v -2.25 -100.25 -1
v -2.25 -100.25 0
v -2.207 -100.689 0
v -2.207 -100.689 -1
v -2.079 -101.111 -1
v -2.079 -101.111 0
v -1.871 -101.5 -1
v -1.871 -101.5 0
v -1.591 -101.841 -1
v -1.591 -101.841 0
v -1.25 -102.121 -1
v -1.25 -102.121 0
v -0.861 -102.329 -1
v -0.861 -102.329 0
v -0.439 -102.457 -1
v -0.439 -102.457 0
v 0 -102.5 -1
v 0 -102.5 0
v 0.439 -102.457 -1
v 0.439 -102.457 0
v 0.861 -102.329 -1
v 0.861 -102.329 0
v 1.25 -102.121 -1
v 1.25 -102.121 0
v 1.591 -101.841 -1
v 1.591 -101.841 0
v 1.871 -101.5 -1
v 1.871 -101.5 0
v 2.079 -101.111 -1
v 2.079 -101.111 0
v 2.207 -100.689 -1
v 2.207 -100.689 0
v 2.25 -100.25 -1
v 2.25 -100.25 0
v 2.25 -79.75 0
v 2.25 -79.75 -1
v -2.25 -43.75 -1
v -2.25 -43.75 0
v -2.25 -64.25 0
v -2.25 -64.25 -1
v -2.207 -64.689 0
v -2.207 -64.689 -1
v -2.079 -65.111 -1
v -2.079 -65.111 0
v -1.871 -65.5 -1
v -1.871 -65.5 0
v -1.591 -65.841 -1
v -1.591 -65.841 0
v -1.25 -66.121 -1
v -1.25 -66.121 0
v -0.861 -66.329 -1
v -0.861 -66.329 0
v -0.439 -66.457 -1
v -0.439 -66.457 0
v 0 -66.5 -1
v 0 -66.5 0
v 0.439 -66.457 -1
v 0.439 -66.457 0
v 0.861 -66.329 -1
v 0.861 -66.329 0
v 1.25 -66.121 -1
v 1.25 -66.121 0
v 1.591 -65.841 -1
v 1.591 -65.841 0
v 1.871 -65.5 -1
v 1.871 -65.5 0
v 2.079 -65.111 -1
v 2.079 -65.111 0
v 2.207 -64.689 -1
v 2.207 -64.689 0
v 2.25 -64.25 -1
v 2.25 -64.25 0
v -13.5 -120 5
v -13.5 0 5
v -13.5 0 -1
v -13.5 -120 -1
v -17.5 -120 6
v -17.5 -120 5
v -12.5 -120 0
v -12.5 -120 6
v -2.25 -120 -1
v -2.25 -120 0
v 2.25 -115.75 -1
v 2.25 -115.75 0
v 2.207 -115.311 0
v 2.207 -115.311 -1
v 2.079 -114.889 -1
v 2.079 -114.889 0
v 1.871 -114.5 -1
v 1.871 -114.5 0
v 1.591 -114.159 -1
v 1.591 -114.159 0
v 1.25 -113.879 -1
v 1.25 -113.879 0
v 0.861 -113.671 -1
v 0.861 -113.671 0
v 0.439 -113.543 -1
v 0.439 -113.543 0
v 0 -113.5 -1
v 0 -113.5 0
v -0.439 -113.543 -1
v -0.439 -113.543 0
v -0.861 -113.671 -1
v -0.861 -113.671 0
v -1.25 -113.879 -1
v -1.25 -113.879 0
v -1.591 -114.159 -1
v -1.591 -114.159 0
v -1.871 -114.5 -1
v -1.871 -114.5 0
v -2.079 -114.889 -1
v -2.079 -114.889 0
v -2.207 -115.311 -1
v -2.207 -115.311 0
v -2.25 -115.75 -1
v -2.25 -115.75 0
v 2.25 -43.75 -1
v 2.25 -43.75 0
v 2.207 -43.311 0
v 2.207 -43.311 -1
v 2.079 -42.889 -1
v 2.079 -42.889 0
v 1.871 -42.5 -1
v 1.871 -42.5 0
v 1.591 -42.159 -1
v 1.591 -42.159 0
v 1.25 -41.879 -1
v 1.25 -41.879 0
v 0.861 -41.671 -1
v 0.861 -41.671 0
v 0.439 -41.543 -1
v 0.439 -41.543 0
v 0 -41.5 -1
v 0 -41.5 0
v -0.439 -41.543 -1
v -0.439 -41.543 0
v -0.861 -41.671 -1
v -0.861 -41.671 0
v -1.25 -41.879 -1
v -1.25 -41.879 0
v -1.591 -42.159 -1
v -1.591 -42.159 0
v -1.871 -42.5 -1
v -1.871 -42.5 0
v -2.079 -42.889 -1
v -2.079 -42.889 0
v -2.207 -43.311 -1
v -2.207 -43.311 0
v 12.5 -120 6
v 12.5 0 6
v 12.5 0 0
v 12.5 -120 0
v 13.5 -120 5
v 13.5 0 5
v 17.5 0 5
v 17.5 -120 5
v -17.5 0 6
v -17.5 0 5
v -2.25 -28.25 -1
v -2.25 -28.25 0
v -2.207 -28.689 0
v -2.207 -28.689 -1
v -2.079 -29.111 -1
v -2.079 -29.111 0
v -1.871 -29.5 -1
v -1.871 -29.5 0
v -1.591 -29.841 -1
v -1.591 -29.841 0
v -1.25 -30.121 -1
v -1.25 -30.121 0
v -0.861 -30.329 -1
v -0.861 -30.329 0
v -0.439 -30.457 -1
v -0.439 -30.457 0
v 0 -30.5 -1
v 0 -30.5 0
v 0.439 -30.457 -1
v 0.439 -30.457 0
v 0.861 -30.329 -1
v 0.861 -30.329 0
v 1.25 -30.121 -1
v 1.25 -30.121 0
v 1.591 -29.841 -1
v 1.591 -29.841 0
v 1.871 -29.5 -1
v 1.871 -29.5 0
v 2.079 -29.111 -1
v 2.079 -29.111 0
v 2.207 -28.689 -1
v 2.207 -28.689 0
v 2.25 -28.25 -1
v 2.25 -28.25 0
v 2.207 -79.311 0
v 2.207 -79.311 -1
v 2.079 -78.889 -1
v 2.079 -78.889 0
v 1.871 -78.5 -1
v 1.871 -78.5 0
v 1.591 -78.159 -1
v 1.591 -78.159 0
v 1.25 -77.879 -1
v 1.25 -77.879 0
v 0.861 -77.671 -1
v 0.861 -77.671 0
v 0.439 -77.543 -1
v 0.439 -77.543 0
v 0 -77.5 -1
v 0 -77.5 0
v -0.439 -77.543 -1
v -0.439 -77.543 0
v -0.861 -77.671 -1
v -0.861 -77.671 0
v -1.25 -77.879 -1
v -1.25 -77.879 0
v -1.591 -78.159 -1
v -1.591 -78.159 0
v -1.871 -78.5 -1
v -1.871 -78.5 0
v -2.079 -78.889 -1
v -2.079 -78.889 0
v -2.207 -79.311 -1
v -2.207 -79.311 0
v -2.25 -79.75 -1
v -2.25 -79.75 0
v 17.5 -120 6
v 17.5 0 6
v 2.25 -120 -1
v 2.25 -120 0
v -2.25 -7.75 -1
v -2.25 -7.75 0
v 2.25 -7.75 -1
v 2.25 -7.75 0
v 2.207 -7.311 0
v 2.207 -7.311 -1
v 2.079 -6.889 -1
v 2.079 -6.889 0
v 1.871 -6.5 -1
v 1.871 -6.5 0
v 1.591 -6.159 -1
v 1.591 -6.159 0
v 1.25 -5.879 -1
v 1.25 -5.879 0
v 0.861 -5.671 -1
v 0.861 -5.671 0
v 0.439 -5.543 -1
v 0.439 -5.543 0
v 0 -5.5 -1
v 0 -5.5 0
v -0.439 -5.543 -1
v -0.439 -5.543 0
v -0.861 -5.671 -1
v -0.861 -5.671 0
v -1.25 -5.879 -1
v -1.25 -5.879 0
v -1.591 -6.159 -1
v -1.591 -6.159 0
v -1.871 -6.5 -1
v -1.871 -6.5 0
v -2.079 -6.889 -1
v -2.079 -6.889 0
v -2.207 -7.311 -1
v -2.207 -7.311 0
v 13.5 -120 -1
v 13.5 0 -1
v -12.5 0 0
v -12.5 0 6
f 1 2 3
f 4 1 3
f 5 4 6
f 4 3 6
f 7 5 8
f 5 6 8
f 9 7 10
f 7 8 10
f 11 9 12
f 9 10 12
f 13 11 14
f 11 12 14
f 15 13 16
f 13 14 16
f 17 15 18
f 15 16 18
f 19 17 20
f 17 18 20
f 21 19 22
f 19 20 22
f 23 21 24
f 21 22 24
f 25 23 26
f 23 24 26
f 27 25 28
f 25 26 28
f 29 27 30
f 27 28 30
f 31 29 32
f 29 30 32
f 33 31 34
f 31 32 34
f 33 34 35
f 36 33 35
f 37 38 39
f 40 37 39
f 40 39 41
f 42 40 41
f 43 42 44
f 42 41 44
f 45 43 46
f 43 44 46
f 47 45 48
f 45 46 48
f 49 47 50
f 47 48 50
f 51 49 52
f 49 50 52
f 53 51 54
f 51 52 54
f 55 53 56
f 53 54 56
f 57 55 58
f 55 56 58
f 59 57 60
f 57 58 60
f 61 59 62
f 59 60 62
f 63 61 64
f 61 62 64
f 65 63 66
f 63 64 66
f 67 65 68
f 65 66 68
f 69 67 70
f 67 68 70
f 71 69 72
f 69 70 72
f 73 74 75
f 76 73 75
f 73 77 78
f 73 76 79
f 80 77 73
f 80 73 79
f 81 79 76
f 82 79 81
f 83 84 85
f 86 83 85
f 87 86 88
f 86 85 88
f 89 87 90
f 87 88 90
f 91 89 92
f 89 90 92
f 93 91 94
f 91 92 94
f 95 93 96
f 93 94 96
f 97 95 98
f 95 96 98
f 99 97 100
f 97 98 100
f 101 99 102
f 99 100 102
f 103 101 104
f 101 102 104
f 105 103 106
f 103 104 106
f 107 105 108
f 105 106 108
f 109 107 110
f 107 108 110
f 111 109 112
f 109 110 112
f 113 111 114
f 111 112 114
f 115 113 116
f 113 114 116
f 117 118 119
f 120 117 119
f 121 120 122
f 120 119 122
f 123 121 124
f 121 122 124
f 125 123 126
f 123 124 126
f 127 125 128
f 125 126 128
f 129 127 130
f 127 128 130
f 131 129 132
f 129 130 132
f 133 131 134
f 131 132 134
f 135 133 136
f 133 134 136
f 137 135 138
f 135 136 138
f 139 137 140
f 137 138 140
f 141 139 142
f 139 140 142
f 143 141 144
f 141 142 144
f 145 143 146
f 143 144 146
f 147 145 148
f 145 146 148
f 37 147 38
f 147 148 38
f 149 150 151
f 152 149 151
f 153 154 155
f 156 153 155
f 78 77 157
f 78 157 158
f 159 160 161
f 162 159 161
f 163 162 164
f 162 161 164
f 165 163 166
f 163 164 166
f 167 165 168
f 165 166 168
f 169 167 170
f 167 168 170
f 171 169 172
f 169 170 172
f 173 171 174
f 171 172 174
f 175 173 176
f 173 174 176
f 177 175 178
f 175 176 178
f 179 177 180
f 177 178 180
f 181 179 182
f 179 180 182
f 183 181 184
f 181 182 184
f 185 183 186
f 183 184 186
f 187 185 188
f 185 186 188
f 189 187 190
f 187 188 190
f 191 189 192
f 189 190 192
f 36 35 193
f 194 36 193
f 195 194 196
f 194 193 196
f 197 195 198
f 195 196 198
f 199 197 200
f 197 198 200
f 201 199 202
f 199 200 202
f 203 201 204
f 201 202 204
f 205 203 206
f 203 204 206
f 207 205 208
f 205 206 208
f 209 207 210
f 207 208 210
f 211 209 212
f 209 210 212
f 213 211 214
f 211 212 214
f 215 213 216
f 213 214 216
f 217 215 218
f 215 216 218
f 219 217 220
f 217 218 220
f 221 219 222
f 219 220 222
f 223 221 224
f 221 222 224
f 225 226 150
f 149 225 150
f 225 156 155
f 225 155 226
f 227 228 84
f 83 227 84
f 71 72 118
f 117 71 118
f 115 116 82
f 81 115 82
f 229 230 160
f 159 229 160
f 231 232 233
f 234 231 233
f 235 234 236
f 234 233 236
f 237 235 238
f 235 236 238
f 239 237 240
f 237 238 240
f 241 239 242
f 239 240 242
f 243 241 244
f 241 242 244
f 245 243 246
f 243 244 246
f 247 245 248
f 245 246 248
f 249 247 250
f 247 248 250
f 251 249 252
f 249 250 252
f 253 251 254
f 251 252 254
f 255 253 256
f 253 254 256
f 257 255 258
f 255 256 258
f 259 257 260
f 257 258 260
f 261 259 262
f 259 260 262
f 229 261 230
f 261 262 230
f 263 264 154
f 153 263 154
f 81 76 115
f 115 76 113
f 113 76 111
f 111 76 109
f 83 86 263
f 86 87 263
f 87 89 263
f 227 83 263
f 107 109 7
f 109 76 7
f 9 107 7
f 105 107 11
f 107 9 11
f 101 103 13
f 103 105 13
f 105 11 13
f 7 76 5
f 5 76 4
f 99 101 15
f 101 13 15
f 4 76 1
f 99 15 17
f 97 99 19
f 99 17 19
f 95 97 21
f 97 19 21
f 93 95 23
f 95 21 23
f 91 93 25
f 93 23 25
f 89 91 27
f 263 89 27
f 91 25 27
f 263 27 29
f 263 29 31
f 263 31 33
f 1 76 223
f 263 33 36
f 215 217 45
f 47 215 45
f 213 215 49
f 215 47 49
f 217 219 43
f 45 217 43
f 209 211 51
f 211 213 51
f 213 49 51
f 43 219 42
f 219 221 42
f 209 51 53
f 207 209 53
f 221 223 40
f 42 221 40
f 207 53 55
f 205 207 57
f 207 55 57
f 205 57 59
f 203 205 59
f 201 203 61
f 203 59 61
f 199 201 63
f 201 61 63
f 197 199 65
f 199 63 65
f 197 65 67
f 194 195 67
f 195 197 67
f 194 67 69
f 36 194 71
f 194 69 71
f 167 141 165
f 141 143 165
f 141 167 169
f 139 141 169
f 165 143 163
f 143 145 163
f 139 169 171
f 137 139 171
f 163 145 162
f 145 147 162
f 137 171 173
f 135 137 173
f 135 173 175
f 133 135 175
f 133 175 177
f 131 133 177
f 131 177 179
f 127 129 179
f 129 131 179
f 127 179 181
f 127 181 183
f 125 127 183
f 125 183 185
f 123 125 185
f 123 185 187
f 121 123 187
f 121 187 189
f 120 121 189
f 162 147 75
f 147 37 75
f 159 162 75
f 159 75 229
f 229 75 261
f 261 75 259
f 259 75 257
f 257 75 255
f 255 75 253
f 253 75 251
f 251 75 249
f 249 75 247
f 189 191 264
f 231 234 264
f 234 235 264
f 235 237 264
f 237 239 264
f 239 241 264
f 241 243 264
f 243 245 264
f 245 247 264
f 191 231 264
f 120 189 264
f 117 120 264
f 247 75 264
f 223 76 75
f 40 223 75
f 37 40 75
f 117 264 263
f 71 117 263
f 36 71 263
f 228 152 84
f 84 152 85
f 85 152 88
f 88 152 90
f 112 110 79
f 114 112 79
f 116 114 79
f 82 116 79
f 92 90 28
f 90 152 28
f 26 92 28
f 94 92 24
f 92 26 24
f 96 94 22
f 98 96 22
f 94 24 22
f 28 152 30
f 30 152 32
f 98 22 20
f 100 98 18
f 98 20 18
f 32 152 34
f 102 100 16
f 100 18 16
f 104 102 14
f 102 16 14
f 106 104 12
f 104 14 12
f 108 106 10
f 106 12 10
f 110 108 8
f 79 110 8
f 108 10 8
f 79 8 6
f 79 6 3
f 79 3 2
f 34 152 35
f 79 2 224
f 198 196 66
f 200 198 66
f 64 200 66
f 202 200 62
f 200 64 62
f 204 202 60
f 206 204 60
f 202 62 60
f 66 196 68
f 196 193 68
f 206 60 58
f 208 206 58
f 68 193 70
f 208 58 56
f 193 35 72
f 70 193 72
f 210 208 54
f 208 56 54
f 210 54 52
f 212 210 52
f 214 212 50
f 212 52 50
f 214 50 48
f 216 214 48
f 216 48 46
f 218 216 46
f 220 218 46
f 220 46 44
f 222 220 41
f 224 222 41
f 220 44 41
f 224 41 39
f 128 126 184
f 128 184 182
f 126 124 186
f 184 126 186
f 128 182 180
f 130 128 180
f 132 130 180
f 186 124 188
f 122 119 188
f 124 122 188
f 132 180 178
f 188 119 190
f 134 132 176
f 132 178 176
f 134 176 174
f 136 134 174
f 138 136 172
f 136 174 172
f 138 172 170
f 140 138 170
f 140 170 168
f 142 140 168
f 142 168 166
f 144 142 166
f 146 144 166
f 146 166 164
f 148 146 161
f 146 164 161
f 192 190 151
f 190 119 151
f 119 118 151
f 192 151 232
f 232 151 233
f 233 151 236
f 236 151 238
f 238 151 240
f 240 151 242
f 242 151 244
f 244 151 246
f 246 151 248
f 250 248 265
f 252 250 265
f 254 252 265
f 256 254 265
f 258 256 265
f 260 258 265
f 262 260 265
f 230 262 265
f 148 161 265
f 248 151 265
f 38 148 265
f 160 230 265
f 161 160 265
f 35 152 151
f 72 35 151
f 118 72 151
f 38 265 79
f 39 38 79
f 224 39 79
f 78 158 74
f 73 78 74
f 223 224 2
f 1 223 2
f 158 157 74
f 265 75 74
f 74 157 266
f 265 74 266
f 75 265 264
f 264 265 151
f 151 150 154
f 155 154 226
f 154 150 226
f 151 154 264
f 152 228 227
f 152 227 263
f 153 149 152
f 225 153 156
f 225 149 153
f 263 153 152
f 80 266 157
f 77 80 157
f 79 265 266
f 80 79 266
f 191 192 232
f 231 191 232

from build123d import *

# Parameters (mm, degrees)
F1_DEPTH = 120
F3_DEPTH = 1.001


# Not quite as in the source:
# - a feature names something its author has since deleted; it is built from what else it names


with BuildPart() as f1:
    # F0 (on Front) → F1 (new body)
    with BuildSketch(Plane.XZ):
        Polygon((-17.5, 6), (-17.5, 5), (-13.5, 5), (-13.5, -1), (13.5, -1), (13.5, 5), (17.5, 5), (17.5, 6), (12.5, 6), (12.5, 0), (-12.5, 0), (-12.5, 6), align=None)
    extrude(amount=F1_DEPTH)

    # F2 (on face) → F3 (cut, through all)
    with BuildSketch(Plane.XY):
        with BuildLine():
            ThreePointArc((-2.25, -28.25), (0, -30.5), (2.25, -28.25))
            Line((2.25, -28.25), (2.25, -7.75))
            ThreePointArc((2.25, -7.75), (0, -5.5), (-2.25, -7.75))
            Line((-2.25, -7.75), (-2.25, -28.25))
        make_face()
        with BuildLine():
            Line((-2.25, -43.75), (-2.25, -64.25))
            ThreePointArc((-2.25, -64.25), (0, -66.5), (2.25, -64.25))
            Line((2.25, -64.25), (2.25, -43.75))
            ThreePointArc((2.25, -43.75), (0, -41.5), (-2.25, -43.75))
        make_face()
        with BuildLine():
            Line((-2.25, -79.75), (-2.25, -100.25))
            ThreePointArc((-2.25, -100.25), (0, -102.5), (2.25, -100.25))
            Line((2.25, -100.25), (2.25, -79.75))
            ThreePointArc((2.25, -79.75), (0, -77.5), (-2.25, -79.75))
        make_face()
        with BuildLine():
            Line((-2.25, -120), (-2.25, -136.25))
            ThreePointArc((-2.25, -136.25), (0, -138.5), (2.25, -136.25))
            Line((2.25, -136.25), (2.25, -120))
            Line((2.25, -120), (-2.25, -120))
        make_face()
        with BuildLine():
            Line((-2.25, -115.75), (-2.25, -120))
            Line((-2.25, -120), (2.25, -120))
            Line((2.25, -120), (2.25, -115.75))
            ThreePointArc((2.25, -115.75), (0, -113.5), (-2.25, -115.75))
        make_face()
    extrude(amount=-F3_DEPTH, mode=Mode.SUBTRACT)


solid = f1.part
